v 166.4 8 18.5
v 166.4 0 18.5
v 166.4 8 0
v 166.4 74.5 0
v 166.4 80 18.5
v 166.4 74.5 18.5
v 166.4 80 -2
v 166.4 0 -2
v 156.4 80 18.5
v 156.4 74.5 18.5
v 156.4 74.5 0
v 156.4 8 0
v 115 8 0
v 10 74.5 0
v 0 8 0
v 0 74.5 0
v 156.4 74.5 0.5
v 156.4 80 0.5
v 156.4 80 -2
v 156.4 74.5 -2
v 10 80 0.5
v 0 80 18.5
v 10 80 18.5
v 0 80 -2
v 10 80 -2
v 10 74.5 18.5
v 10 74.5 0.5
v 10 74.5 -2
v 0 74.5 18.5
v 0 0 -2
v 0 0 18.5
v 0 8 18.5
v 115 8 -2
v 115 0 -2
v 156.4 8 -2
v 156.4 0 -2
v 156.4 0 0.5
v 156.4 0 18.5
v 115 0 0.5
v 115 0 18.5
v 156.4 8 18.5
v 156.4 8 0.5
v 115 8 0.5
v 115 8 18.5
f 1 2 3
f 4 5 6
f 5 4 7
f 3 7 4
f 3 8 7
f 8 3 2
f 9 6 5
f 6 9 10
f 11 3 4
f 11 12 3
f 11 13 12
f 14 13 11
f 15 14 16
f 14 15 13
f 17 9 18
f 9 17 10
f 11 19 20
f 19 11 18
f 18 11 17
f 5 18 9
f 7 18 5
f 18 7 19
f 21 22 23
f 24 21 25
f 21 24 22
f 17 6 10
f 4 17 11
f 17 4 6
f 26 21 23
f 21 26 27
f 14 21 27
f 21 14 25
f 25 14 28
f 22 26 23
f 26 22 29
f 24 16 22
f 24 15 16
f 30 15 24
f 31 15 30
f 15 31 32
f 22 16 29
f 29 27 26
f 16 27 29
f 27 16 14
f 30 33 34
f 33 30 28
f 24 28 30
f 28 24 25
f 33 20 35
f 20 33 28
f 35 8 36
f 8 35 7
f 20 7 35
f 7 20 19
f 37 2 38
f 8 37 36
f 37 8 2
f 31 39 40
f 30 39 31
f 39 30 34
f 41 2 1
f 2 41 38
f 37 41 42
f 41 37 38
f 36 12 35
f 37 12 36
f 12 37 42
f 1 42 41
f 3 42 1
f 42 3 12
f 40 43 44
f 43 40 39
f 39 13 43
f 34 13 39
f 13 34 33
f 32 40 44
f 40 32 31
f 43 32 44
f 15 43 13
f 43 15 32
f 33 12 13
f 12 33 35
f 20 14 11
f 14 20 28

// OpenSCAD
// Grundmaße
wanddicke = 2;
breite = 162.4 + (2*wanddicke);
hoehe = 80;
basisdicke = 2;  // Dicke der Grundplatte nach unten

// Verdickungsparameter
verdickung_hoehe = 18.5;
verdickung_breite_links = 10;  // Breite der linken Verdickung
verdickung_breite_rechts = 10; // Breite der rechten Verdickung
verdickung_tiefe = 8;

// Parameter für die horizontale Länge (X-Achse) der unteren Verdickungen
// Hier können die gewünschten Längen in mm gesetzt werden
// Standardwerte sind nur die Breite der Verdickungen
verdickung_laenge_unten_links = verdickung_breite_links;  // Linke untere Verdickung (von rechter Kante nach innen)
verdickung_laenge_unten_rechts = 115;  // Rechte untere Verdickung (von linker Kante nach innen)

// Abstand zwischen den Blöcken
abstand_zwischen_bloecken = 66.5;

// Berechnete Werte
luecke_breite_oben = breite - verdickung_breite_links - verdickung_breite_rechts;

// Maximalen Abstand berechnen (damit obere Verdickung passt)
max_abstand = hoehe - verdickung_tiefe - 5; // 5mm Mindesthöhe
aktueller_abstand = min(abstand_zwischen_bloecken, max_abstand);
oberer_y = verdickung_tiefe + aktueller_abstand;
obere_hoehe = hoehe - oberer_y;

// Hauptmodell
difference() {
    union() {
        // Grundplatte (nach unten wachsend)
        translate([0, 0, -basisdicke]) 
            cube([breite, hoehe, basisdicke]);
        
        // Verdickung links (unten) - mit variabler Länge
        translate([breite - verdickung_laenge_unten_links, 0, 0]) 
            cube([verdickung_laenge_unten_links, verdickung_tiefe, verdickung_hoehe]);
        
        // Verdickung rechts (unten) - mit variabler Länge
        translate([0, 0, 0]) 
            cube([verdickung_laenge_unten_rechts, verdickung_tiefe, verdickung_hoehe]);
        
        // Obere Verdickungen (nur wenn genug Platz vorhanden)
        if (hoehe > verdickung_tiefe + 5) {
            // Obere Verdickung links - Standard breite
            translate([breite - verdickung_breite_links, oberer_y, 0]) 
                cube([verdickung_breite_links, obere_hoehe, verdickung_hoehe]);
            
            // Obere Verdickung rechts - Standard breite
            translate([0, oberer_y, 0]) 
                cube([verdickung_breite_rechts, obere_hoehe, verdickung_hoehe]);
        }
    }
    
    // Löcher in der Deckschicht zwischen den Verdickungen
    // Unteres Loch - zwischen den unteren Verdickungen mit variabler Länge
    gap_start_unten = verdickung_laenge_unten_rechts;
    gap_end_unten = breite - verdickung_laenge_unten_links;
    gap_width_unten = gap_end_unten - gap_start_unten;
    
    // Nur eine Lücke erzeugen, wenn die Verdickungen sich nicht überlappen
    if (gap_width_unten > 0) {
        translate([gap_start_unten, 0, -basisdicke - 0.5]) 
            cube([gap_width_unten, verdickung_tiefe, basisdicke + 1]);
    }
        
    // Oberes Loch - zwischen den oberen Verdickungen (Standard)
    if (hoehe > verdickung_tiefe + 5) {
        translate([verdickung_breite_rechts, oberer_y, -basisdicke - 0.5]) 
            cube([luecke_breite_oben, obere_hoehe, basisdicke + 1]);
    }
}
